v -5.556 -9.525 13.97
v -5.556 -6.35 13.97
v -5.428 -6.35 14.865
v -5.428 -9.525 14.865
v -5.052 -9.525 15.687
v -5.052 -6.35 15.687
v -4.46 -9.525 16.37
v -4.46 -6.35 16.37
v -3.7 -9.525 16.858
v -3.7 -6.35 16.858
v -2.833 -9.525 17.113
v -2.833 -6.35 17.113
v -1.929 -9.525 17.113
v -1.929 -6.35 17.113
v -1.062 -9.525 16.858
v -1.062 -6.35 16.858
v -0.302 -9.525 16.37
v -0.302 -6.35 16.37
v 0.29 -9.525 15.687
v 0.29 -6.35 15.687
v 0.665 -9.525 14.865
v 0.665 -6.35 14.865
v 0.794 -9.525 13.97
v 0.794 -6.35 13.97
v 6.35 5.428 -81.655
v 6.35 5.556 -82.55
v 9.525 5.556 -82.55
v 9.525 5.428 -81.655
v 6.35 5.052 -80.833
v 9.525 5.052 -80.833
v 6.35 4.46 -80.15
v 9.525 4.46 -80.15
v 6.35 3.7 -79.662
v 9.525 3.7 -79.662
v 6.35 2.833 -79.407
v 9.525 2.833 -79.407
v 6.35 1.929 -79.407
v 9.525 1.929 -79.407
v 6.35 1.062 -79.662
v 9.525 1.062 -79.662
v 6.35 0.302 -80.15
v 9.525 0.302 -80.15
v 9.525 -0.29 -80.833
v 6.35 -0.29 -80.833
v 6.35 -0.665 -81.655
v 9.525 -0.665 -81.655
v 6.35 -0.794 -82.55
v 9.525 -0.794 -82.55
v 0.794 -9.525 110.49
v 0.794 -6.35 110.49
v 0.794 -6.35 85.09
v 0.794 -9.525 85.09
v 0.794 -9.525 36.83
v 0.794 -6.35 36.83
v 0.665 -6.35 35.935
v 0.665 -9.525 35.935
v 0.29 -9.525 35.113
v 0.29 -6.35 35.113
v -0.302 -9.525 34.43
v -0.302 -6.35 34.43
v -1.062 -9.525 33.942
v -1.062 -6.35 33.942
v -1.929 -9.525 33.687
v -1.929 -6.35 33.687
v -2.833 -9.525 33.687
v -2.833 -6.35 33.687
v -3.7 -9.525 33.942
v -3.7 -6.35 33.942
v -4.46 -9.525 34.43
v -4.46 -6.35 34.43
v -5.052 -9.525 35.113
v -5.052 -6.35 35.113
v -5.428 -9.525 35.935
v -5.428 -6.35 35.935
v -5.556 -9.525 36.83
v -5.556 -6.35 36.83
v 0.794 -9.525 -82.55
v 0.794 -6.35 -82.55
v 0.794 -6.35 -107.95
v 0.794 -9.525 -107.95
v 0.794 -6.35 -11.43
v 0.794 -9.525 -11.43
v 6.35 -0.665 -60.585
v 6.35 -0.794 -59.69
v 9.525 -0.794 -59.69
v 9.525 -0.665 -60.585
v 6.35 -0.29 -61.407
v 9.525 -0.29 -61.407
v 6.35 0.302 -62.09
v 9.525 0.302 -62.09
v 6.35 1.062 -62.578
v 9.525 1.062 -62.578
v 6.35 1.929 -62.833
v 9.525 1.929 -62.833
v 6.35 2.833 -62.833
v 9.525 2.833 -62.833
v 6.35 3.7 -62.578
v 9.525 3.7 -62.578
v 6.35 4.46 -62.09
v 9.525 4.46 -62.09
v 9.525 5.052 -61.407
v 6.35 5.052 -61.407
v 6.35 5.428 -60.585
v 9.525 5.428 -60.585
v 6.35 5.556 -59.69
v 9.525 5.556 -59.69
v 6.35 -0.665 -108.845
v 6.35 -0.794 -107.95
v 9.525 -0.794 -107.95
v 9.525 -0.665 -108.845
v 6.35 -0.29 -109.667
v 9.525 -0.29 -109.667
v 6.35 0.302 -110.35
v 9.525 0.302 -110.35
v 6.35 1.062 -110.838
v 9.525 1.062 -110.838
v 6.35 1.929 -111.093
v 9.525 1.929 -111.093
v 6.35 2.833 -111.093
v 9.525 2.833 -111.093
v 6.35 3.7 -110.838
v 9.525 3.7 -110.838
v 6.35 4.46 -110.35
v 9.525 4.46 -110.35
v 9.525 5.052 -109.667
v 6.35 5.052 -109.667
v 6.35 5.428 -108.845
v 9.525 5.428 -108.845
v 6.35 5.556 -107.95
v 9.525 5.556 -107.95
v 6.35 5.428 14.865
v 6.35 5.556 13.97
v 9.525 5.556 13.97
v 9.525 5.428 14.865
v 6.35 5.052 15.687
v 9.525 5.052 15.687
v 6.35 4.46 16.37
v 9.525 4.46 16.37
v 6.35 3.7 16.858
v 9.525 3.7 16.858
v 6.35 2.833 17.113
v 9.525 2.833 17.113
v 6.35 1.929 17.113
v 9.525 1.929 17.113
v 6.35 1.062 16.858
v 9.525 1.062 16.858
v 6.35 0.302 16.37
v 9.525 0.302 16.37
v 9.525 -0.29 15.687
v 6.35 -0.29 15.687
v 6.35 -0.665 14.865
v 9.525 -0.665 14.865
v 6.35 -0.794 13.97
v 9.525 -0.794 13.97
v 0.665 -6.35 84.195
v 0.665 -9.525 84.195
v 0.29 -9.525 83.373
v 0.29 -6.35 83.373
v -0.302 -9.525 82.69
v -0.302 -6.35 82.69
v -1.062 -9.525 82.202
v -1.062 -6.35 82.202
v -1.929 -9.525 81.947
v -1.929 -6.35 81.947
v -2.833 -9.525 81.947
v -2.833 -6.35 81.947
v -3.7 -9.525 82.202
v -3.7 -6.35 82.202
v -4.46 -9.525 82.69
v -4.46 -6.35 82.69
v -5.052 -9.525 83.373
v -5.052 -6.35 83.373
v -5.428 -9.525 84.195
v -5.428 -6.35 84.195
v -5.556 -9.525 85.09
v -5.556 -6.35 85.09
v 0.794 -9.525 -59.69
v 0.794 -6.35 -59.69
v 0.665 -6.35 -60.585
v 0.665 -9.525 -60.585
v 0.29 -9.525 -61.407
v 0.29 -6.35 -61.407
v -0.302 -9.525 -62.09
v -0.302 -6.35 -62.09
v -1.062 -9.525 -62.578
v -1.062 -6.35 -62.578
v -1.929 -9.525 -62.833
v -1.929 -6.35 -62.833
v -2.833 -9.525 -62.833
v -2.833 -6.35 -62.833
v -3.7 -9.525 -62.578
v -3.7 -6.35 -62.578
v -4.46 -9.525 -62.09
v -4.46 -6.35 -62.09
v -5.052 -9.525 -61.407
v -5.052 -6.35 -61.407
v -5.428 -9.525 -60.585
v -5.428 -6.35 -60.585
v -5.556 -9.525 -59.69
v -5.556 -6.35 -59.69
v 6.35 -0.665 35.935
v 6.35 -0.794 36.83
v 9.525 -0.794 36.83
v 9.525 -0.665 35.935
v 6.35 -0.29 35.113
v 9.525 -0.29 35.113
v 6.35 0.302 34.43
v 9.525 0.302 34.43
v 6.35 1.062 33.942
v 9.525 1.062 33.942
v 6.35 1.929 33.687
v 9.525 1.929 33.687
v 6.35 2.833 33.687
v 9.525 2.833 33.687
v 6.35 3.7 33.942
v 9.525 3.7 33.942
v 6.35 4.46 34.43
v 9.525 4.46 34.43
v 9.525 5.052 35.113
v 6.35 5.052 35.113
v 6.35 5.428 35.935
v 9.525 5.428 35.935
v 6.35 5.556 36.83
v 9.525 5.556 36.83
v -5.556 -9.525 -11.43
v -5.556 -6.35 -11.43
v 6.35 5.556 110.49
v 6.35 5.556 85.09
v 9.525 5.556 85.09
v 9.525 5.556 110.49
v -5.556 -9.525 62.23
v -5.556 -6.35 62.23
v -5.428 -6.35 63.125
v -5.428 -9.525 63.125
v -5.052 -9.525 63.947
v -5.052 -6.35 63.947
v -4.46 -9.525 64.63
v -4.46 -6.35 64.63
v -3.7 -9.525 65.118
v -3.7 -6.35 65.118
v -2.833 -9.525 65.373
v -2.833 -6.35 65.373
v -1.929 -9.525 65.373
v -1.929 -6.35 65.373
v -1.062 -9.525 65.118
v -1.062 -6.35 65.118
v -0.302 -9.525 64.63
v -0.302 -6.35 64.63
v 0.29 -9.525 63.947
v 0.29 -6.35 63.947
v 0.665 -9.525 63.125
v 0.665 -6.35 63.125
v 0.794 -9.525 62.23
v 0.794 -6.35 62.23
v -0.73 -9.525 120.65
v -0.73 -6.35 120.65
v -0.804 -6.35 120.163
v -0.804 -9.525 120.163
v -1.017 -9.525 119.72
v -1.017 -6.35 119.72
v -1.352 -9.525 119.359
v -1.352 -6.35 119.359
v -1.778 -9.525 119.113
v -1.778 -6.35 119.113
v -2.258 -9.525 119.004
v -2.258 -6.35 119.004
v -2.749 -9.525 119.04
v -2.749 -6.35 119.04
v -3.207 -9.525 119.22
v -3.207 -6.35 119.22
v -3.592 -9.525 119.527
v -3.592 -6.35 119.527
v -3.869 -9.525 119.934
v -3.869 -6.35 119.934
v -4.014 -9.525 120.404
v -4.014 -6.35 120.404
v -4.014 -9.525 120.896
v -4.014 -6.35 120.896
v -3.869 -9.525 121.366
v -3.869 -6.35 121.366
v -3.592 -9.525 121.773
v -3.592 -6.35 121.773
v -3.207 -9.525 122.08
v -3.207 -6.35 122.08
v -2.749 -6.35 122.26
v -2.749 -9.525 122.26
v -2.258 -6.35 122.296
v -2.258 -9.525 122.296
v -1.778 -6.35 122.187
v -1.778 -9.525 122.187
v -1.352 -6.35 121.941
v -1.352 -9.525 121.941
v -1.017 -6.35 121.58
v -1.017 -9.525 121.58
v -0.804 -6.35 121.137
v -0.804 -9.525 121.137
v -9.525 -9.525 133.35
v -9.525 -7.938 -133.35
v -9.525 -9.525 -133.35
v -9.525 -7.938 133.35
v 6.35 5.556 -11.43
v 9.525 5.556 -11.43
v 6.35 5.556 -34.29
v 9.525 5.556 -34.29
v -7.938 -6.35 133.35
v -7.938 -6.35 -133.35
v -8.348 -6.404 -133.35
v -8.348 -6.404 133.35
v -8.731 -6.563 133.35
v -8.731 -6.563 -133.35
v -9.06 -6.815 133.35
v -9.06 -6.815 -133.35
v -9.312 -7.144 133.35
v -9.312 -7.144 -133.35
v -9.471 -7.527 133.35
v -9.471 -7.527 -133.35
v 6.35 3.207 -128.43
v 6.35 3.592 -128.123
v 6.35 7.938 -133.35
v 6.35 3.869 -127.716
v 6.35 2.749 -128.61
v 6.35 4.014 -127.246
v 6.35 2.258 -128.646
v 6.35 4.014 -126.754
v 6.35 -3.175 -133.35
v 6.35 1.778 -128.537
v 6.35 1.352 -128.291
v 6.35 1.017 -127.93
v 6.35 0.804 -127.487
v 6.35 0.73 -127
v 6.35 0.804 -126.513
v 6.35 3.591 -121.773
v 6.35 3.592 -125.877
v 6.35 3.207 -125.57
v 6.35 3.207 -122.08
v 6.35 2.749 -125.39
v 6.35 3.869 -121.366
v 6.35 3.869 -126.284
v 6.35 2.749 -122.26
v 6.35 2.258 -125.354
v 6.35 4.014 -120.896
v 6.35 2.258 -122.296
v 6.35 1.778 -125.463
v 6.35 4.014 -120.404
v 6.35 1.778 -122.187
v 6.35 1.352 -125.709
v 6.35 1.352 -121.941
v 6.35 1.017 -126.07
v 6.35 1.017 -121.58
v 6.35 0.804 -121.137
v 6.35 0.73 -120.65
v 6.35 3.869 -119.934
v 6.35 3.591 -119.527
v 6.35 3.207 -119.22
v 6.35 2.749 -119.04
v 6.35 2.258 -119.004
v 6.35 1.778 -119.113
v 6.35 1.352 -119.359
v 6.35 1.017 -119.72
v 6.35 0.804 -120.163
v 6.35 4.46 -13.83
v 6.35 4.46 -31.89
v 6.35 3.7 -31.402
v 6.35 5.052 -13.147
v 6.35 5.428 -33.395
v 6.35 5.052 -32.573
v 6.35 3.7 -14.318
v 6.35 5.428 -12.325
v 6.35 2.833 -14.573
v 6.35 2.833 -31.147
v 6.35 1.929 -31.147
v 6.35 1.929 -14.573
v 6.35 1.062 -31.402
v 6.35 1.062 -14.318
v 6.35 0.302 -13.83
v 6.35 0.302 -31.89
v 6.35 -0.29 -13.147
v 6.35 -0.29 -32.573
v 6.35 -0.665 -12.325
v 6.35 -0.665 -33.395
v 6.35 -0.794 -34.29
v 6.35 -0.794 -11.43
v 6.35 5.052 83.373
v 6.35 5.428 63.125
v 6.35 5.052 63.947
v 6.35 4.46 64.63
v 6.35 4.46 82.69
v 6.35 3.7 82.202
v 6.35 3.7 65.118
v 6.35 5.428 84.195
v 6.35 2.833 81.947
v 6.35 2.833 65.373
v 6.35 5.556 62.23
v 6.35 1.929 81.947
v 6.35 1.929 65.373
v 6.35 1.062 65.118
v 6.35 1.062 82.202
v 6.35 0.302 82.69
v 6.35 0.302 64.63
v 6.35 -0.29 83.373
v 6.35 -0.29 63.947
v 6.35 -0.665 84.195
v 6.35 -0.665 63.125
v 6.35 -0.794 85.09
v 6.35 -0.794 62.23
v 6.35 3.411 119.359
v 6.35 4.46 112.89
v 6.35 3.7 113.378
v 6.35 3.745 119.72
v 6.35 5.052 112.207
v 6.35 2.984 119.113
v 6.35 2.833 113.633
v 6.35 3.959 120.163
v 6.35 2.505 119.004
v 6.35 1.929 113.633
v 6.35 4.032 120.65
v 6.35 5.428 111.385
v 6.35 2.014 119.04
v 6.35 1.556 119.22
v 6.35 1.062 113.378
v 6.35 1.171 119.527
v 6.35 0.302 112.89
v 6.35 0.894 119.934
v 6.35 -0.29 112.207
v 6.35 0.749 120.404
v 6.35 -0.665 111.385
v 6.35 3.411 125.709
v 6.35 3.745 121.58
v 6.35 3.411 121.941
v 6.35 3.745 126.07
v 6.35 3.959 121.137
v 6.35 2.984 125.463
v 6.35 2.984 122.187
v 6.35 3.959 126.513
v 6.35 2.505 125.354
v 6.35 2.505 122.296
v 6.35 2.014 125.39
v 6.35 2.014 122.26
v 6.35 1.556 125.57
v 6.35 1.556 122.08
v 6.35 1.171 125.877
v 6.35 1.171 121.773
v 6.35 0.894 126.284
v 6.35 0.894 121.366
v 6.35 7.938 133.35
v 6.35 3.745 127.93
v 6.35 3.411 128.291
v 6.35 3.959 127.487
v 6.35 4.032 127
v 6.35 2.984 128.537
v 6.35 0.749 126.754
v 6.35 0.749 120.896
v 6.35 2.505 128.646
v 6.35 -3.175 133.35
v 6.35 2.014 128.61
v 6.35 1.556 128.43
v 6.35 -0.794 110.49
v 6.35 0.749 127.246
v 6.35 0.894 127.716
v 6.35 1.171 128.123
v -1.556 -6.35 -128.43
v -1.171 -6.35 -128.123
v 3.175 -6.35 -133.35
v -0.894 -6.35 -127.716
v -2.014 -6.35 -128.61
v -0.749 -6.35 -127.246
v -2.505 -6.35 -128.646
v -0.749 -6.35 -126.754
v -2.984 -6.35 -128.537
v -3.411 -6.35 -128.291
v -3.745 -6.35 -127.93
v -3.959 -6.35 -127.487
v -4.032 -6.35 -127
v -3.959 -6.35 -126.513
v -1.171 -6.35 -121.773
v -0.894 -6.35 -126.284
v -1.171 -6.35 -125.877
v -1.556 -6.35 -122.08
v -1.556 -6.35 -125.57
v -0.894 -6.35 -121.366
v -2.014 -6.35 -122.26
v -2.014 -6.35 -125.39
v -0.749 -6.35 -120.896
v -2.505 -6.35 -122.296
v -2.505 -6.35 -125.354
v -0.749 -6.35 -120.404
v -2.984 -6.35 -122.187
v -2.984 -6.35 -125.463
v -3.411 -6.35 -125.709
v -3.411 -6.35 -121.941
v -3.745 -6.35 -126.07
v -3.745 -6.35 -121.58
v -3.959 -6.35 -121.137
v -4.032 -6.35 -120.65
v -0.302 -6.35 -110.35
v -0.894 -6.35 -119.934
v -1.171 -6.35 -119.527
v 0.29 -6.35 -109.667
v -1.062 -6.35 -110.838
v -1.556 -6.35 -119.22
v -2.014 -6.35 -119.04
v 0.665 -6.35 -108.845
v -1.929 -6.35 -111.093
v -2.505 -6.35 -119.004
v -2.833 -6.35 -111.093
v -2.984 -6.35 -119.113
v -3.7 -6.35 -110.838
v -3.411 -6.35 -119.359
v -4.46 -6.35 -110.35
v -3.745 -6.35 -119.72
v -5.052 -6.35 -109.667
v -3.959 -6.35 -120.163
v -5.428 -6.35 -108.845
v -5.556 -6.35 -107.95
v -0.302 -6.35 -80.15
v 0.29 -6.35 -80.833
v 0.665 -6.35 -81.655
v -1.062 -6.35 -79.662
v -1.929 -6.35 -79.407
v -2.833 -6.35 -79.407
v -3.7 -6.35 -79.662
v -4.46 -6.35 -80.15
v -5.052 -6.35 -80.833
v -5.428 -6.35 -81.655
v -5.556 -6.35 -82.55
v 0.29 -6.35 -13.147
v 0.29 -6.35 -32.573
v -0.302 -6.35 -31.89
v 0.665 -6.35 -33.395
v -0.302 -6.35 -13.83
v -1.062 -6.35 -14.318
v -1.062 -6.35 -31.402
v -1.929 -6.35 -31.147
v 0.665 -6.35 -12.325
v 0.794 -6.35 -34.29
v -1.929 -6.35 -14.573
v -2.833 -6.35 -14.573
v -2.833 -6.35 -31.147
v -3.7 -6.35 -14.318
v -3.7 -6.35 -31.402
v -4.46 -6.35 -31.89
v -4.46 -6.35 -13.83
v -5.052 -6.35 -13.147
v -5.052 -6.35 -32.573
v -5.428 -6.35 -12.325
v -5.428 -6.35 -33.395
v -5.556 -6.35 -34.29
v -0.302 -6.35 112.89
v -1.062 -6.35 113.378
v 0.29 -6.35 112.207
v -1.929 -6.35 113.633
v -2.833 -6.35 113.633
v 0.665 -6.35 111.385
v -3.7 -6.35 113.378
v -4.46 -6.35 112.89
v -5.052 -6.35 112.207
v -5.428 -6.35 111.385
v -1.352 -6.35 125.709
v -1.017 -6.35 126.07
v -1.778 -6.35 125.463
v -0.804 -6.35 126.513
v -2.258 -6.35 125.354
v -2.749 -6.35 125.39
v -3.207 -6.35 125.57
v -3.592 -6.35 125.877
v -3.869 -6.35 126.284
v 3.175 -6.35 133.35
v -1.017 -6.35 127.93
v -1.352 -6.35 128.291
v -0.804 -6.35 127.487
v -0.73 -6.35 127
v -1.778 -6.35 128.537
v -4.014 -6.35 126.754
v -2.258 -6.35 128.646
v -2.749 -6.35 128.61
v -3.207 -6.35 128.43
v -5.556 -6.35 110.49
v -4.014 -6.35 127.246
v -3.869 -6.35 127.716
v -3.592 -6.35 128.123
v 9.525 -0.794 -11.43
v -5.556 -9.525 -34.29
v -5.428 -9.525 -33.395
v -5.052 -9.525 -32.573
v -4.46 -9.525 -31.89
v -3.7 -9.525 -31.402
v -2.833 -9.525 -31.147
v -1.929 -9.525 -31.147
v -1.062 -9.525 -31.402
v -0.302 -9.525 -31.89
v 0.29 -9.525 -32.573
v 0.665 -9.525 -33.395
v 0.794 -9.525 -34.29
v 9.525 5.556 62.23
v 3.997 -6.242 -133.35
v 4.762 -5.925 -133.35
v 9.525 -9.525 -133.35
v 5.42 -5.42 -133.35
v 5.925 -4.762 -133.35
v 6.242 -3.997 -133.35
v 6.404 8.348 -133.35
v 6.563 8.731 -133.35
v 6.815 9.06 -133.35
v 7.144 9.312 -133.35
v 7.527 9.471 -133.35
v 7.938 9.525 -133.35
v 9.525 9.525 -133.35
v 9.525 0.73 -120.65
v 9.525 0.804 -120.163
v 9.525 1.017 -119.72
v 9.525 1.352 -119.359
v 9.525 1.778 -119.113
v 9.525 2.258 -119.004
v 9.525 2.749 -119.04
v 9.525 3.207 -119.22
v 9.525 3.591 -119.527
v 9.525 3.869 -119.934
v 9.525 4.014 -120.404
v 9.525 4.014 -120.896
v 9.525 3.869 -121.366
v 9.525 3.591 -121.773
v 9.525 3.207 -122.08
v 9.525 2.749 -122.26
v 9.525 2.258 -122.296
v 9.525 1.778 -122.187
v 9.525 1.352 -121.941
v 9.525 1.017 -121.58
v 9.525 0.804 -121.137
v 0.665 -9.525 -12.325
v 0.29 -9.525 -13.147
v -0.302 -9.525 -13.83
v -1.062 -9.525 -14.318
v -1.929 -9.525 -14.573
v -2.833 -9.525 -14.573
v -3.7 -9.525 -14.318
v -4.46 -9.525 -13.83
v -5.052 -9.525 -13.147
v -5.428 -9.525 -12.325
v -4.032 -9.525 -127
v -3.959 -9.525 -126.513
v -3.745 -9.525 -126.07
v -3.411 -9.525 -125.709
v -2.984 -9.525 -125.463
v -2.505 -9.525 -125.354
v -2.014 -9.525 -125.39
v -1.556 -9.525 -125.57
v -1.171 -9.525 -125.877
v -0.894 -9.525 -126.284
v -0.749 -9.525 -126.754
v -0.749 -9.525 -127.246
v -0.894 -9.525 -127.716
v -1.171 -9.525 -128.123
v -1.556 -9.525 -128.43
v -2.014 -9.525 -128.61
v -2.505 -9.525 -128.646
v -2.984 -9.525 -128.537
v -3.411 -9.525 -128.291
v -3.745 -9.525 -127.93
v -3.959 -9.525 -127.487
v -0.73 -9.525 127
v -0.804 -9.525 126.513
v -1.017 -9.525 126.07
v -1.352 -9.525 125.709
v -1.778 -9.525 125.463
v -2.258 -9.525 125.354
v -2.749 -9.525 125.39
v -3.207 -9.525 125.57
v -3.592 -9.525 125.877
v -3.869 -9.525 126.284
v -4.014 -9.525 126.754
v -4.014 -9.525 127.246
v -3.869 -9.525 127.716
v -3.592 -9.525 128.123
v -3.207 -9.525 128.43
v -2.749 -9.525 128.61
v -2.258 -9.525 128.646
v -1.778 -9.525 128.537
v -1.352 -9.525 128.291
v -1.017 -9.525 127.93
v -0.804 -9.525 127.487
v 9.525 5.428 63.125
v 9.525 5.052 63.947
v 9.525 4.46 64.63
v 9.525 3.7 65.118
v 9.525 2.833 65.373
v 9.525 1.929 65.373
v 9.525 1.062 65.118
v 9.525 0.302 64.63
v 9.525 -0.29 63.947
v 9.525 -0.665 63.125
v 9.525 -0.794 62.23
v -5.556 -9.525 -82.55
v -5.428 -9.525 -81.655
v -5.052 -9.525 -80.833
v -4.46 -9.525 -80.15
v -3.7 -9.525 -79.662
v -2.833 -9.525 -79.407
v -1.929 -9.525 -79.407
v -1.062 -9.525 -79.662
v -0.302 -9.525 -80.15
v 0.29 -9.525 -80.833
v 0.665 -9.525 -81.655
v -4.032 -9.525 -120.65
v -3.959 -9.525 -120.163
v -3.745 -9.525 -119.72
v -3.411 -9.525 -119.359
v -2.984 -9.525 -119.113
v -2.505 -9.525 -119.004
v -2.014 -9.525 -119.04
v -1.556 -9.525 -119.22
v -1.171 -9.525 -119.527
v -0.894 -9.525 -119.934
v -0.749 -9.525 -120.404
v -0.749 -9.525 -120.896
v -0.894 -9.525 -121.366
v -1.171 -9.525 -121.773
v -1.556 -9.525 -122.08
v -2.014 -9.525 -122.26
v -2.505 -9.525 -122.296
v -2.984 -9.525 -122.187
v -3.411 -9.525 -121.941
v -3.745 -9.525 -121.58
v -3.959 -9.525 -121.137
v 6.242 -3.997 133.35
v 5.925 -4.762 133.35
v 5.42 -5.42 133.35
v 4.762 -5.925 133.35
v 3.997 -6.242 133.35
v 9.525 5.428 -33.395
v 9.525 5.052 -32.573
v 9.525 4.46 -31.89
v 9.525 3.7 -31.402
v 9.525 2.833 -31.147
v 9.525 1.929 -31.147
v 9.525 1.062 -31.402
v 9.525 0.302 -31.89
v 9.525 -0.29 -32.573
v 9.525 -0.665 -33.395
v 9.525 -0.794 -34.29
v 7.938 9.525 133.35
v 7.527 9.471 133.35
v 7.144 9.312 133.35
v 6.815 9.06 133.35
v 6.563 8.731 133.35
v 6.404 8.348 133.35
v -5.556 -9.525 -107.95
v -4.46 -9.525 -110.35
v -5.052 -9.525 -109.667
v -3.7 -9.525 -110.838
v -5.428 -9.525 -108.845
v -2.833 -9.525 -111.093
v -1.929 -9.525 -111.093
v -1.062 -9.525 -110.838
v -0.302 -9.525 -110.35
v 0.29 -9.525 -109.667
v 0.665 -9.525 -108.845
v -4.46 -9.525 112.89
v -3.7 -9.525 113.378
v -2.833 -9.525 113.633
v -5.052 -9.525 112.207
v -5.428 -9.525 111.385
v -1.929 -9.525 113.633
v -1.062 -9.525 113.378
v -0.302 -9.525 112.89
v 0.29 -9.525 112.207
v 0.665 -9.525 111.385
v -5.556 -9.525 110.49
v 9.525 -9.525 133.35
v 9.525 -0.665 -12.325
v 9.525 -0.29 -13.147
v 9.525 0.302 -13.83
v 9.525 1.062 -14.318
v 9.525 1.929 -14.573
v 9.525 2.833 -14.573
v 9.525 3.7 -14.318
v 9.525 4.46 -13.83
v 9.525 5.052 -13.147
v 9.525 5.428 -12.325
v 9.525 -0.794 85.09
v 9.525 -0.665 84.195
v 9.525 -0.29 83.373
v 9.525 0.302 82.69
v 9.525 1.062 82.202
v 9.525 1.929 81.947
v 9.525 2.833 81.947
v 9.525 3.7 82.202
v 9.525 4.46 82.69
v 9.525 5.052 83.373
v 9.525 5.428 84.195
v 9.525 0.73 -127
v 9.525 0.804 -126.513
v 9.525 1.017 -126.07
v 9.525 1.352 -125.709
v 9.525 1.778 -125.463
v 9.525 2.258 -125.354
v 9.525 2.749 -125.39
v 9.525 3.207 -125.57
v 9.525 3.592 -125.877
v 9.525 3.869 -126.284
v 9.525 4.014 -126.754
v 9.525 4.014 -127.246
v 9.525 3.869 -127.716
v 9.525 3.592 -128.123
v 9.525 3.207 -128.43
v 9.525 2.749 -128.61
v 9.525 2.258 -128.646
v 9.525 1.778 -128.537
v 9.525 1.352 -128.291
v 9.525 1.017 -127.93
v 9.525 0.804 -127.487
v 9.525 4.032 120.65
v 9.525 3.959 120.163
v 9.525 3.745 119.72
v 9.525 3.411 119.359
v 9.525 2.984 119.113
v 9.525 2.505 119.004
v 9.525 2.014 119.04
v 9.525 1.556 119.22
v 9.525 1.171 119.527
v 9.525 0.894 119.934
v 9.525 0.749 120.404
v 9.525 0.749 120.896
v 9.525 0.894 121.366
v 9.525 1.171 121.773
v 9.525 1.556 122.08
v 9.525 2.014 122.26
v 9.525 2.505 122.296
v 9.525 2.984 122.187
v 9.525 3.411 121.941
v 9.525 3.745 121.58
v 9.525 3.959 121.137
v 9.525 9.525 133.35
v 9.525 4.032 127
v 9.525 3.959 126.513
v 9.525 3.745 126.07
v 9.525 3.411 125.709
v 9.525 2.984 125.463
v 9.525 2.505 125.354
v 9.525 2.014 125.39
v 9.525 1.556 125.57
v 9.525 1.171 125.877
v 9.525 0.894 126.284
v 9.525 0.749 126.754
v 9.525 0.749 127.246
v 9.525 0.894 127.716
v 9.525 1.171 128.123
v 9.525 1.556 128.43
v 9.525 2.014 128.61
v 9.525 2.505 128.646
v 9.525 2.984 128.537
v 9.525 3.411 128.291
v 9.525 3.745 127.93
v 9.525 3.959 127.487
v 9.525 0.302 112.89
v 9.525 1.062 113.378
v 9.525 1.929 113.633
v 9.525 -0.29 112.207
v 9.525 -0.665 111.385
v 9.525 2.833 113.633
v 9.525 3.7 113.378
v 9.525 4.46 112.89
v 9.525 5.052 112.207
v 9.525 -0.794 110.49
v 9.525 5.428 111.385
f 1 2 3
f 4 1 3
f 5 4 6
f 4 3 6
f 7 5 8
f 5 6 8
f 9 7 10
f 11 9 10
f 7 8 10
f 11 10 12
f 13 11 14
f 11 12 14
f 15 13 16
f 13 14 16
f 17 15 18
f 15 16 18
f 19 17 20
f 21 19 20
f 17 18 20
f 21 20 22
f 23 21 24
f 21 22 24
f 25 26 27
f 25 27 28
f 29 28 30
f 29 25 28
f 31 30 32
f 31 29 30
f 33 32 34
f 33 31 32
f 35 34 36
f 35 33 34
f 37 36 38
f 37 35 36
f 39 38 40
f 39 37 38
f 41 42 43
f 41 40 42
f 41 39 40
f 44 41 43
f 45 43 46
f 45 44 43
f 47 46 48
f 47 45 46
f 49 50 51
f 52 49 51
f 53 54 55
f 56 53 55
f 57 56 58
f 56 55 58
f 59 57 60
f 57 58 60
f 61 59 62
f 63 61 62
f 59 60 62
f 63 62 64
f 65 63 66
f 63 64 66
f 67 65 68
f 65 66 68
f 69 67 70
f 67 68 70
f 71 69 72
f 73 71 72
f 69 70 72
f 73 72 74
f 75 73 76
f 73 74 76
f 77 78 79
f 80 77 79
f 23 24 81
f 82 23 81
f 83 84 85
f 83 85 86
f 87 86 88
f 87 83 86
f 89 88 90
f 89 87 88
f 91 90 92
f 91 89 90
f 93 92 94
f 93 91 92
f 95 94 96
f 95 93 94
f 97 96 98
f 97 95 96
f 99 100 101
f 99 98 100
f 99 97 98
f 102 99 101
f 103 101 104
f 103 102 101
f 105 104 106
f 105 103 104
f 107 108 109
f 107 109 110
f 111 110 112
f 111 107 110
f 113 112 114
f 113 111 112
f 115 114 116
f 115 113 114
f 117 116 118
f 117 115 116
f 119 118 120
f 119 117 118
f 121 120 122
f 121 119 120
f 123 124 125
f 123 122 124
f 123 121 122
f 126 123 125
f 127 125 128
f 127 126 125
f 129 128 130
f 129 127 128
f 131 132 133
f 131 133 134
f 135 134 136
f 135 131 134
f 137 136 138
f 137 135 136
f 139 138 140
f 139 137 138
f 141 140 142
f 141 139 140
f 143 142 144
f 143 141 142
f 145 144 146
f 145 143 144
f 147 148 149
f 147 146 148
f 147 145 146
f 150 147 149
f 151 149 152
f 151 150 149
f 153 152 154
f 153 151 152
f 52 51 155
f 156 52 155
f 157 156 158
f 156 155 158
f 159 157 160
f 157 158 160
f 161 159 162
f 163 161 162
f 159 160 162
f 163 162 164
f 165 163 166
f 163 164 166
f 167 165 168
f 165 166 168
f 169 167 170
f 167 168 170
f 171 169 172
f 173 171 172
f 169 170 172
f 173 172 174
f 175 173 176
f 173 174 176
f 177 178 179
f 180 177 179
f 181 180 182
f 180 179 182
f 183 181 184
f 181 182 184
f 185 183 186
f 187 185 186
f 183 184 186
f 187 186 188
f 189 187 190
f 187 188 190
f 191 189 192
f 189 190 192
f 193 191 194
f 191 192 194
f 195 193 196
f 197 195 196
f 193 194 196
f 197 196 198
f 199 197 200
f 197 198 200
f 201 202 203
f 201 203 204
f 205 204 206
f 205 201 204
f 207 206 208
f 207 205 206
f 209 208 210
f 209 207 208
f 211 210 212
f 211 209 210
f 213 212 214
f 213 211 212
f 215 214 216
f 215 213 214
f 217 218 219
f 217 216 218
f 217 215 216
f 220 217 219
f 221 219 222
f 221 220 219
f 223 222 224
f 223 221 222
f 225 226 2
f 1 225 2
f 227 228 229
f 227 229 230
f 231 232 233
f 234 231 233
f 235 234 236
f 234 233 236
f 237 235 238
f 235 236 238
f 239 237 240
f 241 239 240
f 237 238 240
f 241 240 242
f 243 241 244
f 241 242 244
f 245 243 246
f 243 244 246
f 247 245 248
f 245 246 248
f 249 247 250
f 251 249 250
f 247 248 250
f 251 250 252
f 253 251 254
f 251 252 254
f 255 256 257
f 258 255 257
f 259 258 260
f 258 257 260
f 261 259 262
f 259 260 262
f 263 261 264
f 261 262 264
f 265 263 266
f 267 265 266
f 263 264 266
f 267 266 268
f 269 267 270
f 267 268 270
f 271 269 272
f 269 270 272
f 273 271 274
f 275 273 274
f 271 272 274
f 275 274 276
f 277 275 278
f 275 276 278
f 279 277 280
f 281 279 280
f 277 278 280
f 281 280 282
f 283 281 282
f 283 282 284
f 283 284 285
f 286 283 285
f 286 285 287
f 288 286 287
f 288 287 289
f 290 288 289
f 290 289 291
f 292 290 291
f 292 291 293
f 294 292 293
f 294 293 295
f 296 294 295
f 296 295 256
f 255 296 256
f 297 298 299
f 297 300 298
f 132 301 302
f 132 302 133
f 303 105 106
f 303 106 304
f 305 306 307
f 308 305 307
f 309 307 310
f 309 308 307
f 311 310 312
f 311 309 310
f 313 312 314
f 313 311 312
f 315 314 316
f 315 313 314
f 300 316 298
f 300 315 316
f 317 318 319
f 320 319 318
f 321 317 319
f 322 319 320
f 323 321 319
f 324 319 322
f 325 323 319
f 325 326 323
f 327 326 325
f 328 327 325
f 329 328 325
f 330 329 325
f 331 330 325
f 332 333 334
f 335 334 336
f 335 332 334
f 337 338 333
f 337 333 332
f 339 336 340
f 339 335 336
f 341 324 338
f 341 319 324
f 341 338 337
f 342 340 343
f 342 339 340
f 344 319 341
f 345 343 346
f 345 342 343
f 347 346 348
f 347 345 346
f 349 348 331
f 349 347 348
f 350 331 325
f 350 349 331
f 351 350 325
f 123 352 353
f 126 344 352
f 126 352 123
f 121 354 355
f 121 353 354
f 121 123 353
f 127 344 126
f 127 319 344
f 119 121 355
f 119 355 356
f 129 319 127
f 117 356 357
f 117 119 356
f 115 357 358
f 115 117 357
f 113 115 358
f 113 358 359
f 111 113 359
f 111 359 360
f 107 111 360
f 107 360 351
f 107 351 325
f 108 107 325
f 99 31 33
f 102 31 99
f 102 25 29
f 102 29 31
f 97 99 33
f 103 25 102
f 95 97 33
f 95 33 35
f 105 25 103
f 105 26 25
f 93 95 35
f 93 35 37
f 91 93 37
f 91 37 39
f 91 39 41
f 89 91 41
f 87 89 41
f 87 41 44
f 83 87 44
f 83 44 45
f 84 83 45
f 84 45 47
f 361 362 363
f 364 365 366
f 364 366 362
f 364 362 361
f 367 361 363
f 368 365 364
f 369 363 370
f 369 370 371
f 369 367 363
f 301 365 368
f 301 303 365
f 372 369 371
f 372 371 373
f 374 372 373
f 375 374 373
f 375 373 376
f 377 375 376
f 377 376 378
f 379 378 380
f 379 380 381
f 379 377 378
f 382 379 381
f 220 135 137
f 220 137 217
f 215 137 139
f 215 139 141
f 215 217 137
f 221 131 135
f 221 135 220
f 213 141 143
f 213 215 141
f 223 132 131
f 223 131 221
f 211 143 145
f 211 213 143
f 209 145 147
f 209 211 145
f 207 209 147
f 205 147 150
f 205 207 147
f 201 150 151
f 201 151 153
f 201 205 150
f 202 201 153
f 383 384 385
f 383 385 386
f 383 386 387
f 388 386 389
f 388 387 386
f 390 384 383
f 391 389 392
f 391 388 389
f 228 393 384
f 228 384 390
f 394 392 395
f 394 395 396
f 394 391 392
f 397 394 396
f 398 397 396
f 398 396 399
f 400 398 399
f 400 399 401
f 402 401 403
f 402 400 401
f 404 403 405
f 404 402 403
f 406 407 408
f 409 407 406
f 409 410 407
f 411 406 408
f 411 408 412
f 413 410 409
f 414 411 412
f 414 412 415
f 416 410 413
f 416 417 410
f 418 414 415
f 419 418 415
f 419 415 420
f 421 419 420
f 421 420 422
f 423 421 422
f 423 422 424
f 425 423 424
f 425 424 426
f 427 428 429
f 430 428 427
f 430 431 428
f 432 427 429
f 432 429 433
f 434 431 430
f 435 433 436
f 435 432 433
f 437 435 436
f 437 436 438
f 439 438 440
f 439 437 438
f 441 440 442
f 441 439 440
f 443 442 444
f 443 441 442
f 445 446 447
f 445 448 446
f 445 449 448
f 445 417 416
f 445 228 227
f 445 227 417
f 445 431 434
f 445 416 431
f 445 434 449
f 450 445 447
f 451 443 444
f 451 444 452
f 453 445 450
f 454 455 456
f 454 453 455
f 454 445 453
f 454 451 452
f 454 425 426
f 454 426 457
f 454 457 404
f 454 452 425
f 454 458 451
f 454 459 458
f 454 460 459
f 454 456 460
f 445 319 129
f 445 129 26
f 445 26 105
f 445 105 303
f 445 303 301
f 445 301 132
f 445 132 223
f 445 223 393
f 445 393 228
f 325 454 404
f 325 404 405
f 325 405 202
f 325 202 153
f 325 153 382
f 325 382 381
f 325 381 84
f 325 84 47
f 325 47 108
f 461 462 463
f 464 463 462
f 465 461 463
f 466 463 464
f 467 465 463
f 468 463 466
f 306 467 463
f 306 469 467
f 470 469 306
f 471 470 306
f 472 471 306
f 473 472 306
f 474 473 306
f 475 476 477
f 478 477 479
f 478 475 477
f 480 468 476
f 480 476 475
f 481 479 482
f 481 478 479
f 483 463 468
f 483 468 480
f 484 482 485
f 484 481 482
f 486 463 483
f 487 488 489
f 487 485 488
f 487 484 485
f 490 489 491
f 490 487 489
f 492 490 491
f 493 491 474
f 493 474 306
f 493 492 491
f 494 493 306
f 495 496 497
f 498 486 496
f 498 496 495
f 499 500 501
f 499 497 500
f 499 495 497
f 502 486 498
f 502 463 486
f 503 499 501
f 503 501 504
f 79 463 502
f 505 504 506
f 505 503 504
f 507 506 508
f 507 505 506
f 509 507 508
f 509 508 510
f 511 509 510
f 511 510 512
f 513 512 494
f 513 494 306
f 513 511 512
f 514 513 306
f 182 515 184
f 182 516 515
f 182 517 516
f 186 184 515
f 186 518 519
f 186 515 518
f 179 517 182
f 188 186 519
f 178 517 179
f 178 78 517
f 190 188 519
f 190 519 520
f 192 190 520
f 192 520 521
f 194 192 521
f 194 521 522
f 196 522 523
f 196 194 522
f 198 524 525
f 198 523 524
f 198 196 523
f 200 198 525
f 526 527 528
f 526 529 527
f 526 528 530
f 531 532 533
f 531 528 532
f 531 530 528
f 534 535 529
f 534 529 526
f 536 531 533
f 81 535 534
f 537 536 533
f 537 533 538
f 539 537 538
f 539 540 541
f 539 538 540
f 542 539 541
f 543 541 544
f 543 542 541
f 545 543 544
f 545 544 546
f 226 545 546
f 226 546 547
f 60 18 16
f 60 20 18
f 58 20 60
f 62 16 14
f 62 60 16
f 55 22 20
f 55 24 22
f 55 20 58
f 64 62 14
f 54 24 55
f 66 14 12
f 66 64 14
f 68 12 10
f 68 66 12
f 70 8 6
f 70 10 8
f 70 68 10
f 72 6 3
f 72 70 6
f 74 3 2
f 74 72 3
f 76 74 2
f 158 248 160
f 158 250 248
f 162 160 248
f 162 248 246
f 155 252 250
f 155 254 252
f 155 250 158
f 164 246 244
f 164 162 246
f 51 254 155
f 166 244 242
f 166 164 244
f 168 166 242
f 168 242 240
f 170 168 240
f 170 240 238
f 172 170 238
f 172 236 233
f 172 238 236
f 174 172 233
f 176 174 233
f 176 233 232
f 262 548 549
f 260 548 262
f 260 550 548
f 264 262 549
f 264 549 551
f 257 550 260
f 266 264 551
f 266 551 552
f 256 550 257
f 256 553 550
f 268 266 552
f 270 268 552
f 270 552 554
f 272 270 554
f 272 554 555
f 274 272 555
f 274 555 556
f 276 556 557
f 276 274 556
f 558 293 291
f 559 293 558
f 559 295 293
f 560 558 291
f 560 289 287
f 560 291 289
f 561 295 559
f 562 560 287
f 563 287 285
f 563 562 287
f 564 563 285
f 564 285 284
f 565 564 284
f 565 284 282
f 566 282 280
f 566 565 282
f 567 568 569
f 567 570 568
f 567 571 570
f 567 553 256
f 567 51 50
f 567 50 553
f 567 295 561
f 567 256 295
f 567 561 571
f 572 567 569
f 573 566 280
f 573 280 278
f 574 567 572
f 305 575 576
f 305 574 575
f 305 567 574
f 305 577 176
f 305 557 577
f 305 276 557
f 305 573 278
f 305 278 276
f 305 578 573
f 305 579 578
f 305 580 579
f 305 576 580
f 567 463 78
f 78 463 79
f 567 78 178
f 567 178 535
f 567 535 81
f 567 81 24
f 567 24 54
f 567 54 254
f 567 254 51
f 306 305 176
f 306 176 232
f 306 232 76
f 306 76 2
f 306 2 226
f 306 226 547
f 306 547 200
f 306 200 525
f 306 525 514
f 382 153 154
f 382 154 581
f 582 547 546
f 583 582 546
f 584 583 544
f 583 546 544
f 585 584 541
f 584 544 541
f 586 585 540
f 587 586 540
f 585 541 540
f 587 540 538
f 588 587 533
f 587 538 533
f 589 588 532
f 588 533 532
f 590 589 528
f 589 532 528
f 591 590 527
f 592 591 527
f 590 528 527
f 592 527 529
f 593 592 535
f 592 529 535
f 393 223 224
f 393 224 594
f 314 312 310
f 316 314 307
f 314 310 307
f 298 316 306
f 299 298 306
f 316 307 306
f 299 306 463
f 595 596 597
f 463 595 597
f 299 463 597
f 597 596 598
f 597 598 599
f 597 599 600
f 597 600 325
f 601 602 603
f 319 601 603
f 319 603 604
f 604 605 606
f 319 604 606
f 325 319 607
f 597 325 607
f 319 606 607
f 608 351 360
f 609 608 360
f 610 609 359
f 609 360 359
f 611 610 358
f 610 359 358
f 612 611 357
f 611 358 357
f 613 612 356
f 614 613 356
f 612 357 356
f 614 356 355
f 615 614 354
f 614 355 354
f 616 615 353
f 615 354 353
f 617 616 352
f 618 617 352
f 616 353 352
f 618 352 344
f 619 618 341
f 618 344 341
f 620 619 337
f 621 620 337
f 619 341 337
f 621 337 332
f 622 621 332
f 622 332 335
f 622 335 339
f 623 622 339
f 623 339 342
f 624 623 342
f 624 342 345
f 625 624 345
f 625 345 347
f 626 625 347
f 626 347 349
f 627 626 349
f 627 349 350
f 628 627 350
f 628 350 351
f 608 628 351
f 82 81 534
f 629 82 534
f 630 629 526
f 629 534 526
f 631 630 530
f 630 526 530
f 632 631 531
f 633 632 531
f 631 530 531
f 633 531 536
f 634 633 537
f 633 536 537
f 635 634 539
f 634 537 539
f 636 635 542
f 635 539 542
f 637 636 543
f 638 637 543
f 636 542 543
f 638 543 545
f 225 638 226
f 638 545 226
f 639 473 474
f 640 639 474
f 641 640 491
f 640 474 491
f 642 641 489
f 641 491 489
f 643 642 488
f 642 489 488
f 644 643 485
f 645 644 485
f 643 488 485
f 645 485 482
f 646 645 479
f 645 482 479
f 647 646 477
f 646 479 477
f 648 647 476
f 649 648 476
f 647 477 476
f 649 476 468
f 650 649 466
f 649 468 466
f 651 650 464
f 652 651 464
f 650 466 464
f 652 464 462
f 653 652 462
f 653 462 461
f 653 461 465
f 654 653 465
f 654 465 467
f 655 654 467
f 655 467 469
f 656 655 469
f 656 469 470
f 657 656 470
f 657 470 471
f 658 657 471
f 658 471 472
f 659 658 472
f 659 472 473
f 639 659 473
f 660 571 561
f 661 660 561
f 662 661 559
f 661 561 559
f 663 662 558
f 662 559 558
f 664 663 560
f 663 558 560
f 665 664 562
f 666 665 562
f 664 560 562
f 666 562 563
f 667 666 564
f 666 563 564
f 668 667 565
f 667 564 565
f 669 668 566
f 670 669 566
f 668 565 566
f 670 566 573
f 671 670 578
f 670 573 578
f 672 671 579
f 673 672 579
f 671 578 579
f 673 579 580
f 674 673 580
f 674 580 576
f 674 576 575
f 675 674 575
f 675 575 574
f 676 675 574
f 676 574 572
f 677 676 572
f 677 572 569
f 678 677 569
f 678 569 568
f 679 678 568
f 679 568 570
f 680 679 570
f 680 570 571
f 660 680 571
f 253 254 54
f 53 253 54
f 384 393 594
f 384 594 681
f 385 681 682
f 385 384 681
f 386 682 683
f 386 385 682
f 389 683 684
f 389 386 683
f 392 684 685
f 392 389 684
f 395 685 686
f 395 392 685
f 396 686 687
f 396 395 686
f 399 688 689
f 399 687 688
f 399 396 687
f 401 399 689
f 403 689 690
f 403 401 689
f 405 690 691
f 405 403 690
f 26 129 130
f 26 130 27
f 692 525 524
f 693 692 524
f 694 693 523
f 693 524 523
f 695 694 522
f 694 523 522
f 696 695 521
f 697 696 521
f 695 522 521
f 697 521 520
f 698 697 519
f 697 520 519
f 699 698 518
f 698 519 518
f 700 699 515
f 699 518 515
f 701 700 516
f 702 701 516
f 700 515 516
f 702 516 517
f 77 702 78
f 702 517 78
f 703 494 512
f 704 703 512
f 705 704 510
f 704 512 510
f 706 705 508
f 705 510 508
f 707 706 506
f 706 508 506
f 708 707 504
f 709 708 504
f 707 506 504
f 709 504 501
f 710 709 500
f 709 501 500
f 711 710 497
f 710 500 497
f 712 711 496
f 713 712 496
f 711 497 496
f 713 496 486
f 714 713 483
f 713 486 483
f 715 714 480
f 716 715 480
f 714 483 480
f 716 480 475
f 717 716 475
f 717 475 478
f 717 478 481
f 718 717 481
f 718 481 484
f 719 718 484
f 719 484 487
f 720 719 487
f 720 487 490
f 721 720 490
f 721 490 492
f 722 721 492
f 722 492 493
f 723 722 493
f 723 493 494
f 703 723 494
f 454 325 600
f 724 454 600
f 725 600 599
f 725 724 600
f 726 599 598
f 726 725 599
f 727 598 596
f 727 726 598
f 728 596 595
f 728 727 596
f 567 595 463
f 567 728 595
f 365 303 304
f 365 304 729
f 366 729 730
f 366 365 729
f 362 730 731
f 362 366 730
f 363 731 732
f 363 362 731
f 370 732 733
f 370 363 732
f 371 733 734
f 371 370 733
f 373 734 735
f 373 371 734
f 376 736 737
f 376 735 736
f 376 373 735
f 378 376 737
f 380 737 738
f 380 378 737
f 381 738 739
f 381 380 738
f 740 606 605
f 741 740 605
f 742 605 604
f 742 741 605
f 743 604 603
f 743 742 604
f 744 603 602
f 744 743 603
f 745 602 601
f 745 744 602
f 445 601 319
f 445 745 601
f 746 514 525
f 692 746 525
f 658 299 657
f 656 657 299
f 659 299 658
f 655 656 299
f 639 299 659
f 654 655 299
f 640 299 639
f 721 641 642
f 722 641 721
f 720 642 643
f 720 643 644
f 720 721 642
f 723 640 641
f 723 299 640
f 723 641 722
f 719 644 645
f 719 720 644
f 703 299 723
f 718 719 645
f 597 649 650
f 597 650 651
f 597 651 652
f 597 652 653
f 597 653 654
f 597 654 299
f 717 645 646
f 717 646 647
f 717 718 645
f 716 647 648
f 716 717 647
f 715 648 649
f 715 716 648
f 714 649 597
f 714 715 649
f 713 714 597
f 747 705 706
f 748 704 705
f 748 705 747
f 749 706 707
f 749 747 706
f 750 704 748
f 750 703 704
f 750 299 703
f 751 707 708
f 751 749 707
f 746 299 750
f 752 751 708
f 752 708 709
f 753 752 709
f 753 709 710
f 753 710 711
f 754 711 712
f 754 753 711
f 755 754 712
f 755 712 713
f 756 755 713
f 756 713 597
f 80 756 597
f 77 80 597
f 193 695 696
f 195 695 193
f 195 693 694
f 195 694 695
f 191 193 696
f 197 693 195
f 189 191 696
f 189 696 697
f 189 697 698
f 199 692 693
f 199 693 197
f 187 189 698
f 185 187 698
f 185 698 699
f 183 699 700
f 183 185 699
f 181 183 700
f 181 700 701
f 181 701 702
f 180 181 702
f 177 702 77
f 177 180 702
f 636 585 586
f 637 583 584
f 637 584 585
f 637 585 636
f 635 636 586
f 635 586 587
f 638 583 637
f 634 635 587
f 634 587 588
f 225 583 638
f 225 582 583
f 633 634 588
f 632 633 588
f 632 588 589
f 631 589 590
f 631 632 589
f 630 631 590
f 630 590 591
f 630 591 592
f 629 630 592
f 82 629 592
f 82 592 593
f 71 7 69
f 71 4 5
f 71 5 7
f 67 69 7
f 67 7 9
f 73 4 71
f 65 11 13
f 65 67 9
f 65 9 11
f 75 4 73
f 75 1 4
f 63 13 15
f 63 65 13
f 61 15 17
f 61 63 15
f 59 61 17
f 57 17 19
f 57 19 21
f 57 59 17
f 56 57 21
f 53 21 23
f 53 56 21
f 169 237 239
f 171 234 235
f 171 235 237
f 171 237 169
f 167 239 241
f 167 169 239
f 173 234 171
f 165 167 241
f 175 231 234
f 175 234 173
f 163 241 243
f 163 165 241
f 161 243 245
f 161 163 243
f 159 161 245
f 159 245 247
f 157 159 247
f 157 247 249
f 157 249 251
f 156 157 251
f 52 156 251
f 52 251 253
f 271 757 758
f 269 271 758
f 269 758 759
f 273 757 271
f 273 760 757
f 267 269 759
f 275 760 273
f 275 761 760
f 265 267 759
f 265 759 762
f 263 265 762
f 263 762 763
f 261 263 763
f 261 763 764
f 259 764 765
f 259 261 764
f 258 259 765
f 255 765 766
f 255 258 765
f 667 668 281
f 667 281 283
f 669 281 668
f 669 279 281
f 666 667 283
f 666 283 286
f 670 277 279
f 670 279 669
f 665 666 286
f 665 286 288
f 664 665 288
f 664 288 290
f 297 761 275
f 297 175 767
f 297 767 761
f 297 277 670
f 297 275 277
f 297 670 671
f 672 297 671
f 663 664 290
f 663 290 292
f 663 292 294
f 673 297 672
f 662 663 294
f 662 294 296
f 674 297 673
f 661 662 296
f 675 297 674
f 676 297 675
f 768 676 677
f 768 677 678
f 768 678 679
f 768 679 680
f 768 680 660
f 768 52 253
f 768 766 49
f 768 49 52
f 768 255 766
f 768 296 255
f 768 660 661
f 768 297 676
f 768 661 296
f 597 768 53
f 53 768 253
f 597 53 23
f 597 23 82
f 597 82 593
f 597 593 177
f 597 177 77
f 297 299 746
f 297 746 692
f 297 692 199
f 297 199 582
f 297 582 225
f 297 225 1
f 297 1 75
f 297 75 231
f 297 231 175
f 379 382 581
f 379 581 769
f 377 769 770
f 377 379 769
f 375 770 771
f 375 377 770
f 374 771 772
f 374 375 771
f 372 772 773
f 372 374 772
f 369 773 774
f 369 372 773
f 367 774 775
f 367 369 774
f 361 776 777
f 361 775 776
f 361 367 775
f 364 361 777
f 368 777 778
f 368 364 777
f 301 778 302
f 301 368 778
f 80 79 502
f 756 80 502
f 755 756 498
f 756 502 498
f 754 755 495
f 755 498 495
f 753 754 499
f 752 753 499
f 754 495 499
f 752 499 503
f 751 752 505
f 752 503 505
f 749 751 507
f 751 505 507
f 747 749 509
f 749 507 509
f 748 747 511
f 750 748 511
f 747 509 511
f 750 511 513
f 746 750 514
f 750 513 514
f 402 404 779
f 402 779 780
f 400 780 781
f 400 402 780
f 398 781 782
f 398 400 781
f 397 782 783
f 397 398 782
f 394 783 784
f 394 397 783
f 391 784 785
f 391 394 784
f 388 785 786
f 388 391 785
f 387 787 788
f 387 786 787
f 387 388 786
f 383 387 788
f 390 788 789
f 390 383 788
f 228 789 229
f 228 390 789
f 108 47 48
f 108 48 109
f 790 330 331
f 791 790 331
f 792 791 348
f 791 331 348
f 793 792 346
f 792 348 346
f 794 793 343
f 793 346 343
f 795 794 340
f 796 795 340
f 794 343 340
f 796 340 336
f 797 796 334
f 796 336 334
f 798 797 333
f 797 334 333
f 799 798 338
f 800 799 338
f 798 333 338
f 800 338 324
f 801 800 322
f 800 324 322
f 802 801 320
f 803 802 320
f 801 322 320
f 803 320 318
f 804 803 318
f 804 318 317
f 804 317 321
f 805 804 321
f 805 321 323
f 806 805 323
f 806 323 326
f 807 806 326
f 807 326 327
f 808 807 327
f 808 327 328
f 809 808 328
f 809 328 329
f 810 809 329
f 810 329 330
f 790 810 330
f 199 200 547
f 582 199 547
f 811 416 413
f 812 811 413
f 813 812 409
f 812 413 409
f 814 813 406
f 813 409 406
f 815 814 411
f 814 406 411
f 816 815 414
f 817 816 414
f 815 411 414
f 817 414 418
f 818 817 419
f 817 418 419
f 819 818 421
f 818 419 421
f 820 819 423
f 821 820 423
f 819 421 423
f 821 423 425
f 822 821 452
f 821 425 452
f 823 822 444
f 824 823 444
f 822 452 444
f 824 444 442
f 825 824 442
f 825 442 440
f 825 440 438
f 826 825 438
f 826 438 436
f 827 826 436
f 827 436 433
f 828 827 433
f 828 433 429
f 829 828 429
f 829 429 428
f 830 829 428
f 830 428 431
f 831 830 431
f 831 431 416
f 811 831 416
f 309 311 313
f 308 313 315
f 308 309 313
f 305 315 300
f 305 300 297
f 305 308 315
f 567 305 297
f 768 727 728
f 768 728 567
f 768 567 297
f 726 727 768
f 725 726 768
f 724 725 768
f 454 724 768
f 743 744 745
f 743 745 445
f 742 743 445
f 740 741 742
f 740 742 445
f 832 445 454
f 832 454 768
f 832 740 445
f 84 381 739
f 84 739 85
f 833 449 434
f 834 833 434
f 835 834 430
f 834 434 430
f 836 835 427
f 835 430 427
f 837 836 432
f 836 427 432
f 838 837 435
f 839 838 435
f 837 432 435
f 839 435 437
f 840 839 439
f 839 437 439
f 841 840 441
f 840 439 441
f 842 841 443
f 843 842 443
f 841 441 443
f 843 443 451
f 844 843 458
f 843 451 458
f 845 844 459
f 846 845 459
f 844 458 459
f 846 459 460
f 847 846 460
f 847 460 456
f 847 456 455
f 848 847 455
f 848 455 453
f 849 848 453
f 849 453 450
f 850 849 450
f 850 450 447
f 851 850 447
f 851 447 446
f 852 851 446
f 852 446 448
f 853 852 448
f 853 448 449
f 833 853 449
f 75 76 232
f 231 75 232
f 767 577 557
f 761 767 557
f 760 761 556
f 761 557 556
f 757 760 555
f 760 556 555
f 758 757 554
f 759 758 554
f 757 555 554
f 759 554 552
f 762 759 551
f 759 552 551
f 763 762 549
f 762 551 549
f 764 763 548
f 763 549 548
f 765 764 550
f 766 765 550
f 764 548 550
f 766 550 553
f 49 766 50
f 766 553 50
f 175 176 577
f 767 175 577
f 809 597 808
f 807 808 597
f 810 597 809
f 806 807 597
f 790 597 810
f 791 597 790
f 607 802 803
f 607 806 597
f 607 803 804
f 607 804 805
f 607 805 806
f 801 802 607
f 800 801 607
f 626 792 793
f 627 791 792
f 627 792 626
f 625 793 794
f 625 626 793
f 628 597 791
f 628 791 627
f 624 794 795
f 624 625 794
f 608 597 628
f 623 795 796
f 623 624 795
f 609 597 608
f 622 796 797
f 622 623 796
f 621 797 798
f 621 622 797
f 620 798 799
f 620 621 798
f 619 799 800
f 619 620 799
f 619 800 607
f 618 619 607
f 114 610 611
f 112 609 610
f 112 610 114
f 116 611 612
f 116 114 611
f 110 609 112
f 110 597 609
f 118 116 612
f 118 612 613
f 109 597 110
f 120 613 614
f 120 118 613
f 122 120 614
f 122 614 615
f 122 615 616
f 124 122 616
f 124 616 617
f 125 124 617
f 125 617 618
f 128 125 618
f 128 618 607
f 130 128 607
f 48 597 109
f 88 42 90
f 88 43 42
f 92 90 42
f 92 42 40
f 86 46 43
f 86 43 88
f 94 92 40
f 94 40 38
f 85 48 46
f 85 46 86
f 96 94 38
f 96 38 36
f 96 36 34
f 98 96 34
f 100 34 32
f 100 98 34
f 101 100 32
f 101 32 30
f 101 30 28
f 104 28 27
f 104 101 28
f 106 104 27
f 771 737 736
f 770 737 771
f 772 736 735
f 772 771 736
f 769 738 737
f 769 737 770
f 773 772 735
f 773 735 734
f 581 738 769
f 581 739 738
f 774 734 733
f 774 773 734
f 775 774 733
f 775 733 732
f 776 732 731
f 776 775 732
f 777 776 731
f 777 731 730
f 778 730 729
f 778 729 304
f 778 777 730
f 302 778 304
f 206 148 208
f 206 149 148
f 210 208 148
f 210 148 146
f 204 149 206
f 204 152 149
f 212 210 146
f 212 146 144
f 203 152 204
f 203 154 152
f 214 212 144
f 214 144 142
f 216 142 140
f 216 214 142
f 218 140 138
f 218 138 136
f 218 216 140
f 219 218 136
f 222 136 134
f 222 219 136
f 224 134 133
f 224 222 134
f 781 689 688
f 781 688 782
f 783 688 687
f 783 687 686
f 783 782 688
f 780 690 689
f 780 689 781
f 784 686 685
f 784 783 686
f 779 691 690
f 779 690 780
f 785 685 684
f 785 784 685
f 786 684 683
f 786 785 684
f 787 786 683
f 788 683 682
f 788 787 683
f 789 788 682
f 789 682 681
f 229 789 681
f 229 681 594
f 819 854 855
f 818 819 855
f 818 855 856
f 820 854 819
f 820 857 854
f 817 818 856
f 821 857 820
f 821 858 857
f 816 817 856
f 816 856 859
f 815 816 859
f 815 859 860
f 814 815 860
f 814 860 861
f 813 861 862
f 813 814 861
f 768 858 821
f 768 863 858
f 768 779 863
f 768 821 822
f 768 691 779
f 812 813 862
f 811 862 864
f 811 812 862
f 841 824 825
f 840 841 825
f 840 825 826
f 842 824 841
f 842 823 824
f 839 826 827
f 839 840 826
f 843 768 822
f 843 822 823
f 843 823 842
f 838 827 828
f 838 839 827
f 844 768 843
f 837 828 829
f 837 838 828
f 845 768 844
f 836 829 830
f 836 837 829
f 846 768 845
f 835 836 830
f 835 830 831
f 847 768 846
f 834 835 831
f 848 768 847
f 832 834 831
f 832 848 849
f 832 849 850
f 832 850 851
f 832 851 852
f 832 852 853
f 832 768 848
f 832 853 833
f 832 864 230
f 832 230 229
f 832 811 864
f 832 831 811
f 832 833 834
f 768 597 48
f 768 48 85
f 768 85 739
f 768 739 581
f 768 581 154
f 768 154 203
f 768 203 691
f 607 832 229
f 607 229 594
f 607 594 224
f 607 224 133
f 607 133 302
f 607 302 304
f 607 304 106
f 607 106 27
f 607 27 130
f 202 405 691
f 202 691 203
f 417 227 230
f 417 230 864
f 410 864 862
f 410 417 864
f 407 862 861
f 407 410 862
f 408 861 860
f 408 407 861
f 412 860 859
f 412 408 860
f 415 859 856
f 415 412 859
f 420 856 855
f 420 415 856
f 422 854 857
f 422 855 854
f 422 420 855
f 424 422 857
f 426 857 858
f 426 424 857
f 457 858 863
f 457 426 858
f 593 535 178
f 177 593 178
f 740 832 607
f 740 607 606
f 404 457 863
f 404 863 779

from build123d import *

# Parameters (mm, degrees)
BOSS_EXTRUDE1_DEPTH = 133.35
SKETCH3_R           = 1.651
CUT_EXTRUDE1_DEPTH  = 135.628985549
SKETCH4_R           = 1.651
CUT_EXTRUDE2_DEPTH  = 135.628985549
CUT_EXTRUDE3_DEPTH  = 135.628985549
LPATTERN1_COUNT     = 5
LPATTERN1_PITCH     = 48.26
CUT_EXTRUDE4_DEPTH  = 135.628985549
LPATTERN2_COUNT     = 5
LPATTERN2_PITCH     = 48.26


with BuildPart() as part:
    # Sketch2 → Boss-Extrude1 (new, symmetric)
    with BuildSketch(Plane.XY):
        with BuildLine():
            Line((-9.525, -9.525), (9.525, -9.525))
            Line((9.525, -9.525), (9.525, 9.525))
            Line((9.525, 9.525), (7.9375, 9.525))
            ThreePointArc((7.9375, 9.525), (6.814967985, 9.060032015), (6.35, 7.9375))
            Line((6.35, 7.9375), (6.35, -3.175))
            ThreePointArc((6.35, -3.175), (5.42006403, -5.42006403), (3.175, -6.35))
            Line((3.175, -6.35), (-7.9375, -6.35))
            ThreePointArc((-7.9375, -6.35), (-9.060032015, -6.814967985), (-9.525, -7.9375))
            Line((-9.525, -7.9375), (-9.525, -9.525))
        make_face()
    extrude(amount=BOSS_EXTRUDE1_DEPTH, both=True)

    # Sketch3 → Cut-Extrude1 (cut, through all)
    with BuildSketch(Plane(origin=(0, -6.35, 0), x_dir=(1, 0, 0), z_dir=(0, 1, 0))):
        with Locations(Location((-2.38125, 127, 0), (0, 0, 180))):
            Circle(SKETCH3_R)
        with Locations(Location((-2.38125, 120.65, 0), (0, 0, 180))):
            Circle(SKETCH3_R)
        with Locations((-2.38125, -120.65)):
            Circle(SKETCH3_R)
        with Locations((-2.38125, -127)):
            Circle(SKETCH3_R)
    extrude(amount=-CUT_EXTRUDE1_DEPTH, mode=Mode.SUBTRACT)

    # Sketch4 → Cut-Extrude2 (cut, through all)
    with BuildSketch(Plane.ZY.offset(-6.35)):
        with Locations(Location((-127, 2.381250687, 0), (0, 0, 270))):
            Circle(SKETCH4_R)
        with Locations(Location((-120.650000001, 2.381165043, 0), (0, 0, 270))):
            Circle(SKETCH4_R)
        with Locations(Location((120.650000001, 2.381165043, 0), (0, 0, 90))):
            Circle(SKETCH4_R)
        with Locations(Location((127, 2.381250687, 0), (0, 0, 90))):
            Circle(SKETCH4_R)
    extrude(amount=-CUT_EXTRUDE2_DEPTH, mode=Mode.SUBTRACT)

    # Sketch5 → Cut-Extrude3 (cut, through all)
    with BuildSketch(Plane.ZY.offset(-6.35)):
        with BuildLine():
            Line((-107.950000001, 5.556165043), (-82.550000001, 5.556165043))
            ThreePointArc((-82.550000001, 5.556165043), (-79.375000001, 2.381165043), (-82.550000001, -0.793834957))
            Line((-82.550000001, -0.793834957), (-107.950000001, -0.793834957))
            ThreePointArc((-107.950000001, -0.793834957), (-111.125000001, 2.381165043), (-107.950000001, 5.556165043))
        make_face()
    cut_extrude3 = extrude(amount=-CUT_EXTRUDE3_DEPTH, mode=Mode.SUBTRACT)

    # LPattern1: Cut-Extrude3 ×5
    with Locations(*[(0, 0, i * LPATTERN1_PITCH) for i in range(1, LPATTERN1_COUNT)]):
        add(cut_extrude3, mode=Mode.SUBTRACT)

    # Sketch6 → Cut-Extrude4 (cut, through all)
    with BuildSketch(Plane(origin=(0, -6.35, 0), x_dir=(1, 0, 0), z_dir=(0, 1, 0))):
        with BuildLine():
            Line((-5.55625, 107.95), (-5.55625, 82.55))
            ThreePointArc((-5.55625, 82.55), (-2.38125, 79.375), (0.79375, 82.55))
            Line((0.79375, 82.55), (0.79375, 107.95))
            ThreePointArc((0.79375, 107.95), (-2.38125, 111.125), (-5.55625, 107.95))
        make_face()
    cut_extrude4 = extrude(amount=-CUT_EXTRUDE4_DEPTH, mode=Mode.SUBTRACT)

    # LPattern2: Cut-Extrude4 ×5
    with Locations(*[(0, 0, i * LPATTERN2_PITCH) for i in range(1, LPATTERN2_COUNT)]):
        add(cut_extrude4, mode=Mode.SUBTRACT)


solid = part.part
